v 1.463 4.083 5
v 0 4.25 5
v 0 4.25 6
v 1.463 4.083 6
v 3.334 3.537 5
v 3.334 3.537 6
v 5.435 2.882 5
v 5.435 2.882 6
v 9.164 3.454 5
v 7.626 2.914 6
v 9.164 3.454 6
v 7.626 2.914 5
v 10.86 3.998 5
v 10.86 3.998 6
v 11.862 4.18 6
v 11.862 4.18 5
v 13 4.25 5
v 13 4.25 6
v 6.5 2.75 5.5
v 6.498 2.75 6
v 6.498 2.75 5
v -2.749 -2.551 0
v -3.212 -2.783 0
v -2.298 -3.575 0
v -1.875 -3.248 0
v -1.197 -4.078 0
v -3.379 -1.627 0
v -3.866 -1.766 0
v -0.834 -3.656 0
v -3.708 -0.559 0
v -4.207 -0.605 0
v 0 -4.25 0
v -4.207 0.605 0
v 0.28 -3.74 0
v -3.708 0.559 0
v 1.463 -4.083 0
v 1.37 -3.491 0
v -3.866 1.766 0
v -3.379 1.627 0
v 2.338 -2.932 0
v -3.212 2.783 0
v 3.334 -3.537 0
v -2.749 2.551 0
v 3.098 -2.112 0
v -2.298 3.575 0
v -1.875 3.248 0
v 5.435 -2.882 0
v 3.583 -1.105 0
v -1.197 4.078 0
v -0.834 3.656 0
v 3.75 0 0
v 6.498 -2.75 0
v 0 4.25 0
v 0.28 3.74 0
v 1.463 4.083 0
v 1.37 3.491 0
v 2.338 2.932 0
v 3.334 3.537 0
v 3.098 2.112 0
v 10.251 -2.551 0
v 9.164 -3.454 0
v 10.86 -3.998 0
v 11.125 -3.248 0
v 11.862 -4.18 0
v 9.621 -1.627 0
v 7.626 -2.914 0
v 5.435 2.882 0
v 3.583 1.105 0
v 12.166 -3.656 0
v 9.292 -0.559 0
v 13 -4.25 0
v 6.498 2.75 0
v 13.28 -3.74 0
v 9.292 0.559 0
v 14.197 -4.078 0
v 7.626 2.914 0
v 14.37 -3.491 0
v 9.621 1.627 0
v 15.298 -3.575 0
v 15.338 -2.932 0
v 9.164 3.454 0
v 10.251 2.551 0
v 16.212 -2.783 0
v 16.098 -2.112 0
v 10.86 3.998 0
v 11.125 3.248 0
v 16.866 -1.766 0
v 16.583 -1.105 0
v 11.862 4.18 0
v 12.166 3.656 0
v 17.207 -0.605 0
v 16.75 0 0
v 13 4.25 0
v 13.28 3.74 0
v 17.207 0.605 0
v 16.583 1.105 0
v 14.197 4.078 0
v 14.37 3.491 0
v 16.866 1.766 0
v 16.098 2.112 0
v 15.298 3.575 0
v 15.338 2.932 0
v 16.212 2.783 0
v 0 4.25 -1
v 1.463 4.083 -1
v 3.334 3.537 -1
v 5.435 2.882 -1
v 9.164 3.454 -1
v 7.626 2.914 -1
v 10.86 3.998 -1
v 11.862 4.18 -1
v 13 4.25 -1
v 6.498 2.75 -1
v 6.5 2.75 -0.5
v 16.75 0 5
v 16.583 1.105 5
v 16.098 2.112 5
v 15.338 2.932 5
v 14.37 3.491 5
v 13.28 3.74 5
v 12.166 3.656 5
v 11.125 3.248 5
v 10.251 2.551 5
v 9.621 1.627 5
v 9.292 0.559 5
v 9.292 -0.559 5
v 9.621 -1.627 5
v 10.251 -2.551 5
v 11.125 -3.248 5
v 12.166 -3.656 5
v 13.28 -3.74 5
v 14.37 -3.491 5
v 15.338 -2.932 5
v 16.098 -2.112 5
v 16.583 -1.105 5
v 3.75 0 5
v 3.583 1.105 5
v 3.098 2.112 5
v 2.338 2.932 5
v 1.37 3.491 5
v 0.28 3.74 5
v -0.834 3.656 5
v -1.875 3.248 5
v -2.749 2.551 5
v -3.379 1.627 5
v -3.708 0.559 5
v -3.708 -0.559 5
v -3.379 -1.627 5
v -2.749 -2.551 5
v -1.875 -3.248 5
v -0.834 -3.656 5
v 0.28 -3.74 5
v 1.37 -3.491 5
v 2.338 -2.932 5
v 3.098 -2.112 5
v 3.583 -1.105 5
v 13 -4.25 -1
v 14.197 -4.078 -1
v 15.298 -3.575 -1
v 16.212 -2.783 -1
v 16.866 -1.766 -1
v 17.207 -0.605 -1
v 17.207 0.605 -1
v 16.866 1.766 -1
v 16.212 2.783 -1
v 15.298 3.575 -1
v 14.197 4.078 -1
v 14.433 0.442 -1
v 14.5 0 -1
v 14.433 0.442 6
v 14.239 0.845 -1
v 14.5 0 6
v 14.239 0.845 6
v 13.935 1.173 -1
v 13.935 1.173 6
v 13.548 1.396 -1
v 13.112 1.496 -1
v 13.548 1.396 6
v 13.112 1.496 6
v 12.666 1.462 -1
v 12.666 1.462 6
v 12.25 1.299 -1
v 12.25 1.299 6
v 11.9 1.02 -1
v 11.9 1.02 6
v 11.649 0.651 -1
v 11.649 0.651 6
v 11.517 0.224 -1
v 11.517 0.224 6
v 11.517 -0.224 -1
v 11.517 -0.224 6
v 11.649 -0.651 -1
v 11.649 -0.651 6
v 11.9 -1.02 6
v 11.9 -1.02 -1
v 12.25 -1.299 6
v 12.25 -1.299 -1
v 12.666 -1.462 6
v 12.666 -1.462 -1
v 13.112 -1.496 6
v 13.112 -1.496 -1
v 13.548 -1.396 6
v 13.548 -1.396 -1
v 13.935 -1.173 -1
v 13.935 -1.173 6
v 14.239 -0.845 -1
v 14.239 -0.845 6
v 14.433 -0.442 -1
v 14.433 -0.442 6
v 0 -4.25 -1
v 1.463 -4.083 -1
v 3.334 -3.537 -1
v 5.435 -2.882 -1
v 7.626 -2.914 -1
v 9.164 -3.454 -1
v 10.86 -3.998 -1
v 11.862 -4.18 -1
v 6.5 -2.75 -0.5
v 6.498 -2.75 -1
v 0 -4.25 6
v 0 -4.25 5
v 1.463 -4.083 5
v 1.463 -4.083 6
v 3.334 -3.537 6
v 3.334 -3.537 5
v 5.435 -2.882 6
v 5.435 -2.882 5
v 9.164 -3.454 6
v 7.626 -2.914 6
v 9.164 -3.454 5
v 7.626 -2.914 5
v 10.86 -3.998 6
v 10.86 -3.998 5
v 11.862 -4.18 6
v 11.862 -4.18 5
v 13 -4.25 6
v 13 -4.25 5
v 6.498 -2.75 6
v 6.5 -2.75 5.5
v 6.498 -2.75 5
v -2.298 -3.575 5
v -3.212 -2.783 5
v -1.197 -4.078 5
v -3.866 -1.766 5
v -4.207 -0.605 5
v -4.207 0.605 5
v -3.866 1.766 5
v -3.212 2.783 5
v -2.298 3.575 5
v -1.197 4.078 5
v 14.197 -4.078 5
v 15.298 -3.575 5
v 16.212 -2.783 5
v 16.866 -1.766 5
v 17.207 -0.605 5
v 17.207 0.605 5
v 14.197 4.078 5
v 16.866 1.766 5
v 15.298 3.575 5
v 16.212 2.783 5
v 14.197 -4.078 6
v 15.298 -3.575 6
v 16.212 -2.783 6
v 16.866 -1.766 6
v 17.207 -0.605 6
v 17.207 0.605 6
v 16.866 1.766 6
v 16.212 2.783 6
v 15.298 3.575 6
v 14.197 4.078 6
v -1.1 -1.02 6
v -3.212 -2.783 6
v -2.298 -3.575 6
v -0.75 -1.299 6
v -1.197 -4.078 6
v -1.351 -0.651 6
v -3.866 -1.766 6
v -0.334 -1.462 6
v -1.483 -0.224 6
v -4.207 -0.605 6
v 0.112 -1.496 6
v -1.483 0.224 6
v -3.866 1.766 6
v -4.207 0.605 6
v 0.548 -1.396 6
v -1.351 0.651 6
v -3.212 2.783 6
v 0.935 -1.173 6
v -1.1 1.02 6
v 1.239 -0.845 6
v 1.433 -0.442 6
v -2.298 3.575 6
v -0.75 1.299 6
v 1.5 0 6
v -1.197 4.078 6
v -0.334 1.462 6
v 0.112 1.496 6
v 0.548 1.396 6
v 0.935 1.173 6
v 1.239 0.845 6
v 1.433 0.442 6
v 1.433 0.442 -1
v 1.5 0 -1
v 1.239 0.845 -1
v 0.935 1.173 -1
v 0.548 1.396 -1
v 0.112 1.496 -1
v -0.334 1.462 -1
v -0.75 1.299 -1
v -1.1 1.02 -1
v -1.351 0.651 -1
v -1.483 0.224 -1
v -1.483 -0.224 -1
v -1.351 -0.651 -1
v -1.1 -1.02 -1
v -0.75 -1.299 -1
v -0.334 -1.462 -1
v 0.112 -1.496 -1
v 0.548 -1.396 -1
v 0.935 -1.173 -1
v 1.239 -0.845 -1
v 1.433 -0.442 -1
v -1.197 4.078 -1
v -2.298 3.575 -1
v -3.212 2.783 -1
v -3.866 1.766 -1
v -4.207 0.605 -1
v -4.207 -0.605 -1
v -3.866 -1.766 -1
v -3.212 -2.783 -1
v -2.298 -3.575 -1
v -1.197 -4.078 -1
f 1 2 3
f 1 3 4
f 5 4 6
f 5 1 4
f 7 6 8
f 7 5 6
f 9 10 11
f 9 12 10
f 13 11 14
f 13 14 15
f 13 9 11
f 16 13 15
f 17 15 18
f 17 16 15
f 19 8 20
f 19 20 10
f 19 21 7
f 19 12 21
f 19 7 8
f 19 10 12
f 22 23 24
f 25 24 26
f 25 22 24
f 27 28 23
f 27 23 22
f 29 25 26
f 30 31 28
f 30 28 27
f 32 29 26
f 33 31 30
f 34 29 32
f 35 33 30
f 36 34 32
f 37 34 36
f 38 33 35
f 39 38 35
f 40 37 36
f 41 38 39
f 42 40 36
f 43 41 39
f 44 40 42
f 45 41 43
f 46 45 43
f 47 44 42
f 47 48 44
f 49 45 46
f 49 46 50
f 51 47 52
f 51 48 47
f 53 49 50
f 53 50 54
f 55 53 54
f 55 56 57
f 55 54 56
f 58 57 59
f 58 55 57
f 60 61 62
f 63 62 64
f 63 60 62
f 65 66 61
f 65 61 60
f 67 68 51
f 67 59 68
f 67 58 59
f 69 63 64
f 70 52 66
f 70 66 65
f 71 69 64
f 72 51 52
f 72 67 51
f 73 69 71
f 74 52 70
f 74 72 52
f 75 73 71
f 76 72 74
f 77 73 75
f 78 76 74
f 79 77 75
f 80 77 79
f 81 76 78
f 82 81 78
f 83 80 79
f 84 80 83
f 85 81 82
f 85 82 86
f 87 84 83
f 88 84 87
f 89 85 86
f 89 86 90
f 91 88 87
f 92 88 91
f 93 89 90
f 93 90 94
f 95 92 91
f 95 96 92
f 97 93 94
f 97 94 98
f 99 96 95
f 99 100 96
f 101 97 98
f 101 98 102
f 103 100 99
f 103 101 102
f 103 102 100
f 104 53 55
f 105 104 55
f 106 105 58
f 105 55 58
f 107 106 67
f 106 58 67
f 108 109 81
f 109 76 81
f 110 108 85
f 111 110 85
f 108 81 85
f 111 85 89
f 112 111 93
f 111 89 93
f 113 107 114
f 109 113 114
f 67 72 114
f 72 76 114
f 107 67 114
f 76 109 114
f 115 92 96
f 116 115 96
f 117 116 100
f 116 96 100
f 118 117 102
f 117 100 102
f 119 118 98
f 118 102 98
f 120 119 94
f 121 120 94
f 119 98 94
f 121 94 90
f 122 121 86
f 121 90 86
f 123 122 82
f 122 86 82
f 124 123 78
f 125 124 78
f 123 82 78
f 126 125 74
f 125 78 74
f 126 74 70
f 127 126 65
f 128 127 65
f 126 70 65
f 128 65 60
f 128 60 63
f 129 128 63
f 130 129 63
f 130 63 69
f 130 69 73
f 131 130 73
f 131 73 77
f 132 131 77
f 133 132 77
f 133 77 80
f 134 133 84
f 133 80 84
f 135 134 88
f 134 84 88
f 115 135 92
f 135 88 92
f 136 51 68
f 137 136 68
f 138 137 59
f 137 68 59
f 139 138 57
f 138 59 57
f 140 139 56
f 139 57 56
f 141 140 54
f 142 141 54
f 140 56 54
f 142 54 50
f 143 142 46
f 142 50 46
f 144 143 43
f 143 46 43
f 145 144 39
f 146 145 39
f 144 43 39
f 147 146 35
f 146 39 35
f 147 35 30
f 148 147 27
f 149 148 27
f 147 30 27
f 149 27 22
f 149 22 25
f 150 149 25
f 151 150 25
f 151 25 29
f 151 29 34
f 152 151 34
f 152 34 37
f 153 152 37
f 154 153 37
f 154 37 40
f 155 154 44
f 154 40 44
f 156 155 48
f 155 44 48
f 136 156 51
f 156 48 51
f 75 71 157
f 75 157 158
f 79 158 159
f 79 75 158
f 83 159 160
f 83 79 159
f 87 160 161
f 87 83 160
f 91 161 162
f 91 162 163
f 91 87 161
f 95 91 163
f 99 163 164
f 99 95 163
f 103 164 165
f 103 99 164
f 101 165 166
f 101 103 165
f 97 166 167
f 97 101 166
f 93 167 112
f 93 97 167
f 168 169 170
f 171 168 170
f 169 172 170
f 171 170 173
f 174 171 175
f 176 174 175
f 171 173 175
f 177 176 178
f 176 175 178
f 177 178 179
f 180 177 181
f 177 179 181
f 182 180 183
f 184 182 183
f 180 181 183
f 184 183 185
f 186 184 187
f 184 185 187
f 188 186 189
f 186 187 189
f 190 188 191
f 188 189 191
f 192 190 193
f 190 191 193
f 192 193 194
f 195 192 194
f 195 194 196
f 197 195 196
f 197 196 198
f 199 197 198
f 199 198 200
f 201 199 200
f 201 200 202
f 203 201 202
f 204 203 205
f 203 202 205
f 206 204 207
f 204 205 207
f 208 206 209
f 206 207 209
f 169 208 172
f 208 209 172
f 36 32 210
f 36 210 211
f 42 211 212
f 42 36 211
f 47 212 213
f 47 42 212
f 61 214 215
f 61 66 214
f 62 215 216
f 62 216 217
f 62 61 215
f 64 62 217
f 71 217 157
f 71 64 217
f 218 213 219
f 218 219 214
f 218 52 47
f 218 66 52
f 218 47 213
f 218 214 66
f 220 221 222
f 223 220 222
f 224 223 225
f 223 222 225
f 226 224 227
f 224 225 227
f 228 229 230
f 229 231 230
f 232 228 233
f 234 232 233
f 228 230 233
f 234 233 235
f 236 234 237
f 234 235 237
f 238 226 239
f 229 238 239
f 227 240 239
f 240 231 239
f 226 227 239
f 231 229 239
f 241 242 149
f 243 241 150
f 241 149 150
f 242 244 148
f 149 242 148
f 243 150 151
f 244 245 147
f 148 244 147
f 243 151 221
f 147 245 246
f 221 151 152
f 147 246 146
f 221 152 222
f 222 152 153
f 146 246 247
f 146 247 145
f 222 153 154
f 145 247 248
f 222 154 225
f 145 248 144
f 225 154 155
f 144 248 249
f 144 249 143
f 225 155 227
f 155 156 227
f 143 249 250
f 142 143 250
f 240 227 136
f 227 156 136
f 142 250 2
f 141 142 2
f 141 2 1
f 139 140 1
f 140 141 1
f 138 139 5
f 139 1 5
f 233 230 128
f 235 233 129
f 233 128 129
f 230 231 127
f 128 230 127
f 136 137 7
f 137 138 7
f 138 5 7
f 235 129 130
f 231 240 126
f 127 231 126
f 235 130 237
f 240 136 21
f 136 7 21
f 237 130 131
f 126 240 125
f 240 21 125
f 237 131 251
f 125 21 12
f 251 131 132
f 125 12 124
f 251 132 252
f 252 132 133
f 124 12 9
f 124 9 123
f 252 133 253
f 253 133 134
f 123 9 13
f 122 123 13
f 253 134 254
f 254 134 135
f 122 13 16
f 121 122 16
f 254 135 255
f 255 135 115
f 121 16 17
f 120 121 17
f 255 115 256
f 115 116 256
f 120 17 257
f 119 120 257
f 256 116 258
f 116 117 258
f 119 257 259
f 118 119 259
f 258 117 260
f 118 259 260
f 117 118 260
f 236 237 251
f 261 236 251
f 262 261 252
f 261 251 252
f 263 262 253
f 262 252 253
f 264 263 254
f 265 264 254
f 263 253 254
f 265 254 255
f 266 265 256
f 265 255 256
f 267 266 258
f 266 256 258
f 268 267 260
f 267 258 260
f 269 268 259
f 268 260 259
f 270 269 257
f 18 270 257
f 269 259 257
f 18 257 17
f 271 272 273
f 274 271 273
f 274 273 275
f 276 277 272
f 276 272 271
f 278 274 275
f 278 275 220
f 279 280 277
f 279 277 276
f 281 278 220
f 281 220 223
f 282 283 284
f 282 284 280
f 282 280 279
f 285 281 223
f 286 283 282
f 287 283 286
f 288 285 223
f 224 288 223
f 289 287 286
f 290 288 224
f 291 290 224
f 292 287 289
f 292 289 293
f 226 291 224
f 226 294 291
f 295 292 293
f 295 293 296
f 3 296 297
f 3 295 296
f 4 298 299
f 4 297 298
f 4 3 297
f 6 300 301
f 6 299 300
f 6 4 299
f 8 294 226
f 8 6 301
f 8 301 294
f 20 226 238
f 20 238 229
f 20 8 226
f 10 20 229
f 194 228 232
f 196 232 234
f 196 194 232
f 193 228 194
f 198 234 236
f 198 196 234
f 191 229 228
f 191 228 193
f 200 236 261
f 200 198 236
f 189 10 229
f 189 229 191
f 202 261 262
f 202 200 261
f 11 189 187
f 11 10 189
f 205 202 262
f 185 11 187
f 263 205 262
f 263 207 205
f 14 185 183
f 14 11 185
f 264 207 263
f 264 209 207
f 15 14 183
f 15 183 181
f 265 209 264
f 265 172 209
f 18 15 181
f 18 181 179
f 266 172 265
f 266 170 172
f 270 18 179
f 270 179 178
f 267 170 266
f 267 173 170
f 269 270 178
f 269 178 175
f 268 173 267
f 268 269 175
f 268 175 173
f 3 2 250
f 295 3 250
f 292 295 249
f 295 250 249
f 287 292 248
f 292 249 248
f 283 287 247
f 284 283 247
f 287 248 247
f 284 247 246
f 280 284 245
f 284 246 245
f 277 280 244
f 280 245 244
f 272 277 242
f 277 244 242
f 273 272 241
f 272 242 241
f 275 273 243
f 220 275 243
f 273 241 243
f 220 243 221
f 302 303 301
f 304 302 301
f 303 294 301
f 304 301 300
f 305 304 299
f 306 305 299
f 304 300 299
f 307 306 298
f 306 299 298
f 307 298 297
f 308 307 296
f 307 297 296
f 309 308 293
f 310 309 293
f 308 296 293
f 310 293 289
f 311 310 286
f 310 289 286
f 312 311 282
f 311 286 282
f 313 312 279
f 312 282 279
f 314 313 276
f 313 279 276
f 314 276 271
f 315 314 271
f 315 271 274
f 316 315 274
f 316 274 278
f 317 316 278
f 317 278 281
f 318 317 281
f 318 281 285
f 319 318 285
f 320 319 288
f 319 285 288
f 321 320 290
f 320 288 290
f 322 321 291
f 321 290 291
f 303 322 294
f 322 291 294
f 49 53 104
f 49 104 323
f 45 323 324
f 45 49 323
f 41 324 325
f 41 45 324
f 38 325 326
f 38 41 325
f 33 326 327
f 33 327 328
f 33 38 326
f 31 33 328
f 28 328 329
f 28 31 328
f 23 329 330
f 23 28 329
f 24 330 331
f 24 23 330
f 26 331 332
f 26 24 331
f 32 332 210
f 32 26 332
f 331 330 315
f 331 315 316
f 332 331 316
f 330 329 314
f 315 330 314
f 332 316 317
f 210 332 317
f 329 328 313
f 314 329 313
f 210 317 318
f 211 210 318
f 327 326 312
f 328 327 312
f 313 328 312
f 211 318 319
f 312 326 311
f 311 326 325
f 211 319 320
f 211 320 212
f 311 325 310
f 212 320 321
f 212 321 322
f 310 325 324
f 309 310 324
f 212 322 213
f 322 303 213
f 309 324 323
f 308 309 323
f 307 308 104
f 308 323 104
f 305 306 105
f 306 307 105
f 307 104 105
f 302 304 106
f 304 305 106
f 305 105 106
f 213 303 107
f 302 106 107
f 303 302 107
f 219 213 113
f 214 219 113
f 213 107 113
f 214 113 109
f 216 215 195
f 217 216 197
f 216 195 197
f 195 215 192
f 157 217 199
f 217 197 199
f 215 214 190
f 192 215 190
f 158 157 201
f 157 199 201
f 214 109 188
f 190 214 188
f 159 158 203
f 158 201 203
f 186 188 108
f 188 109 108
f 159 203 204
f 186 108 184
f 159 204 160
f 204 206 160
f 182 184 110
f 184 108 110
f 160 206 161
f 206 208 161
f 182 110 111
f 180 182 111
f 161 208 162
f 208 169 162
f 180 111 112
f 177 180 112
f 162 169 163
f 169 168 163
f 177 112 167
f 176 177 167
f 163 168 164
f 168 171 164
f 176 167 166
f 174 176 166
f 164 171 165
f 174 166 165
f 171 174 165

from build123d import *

# Parameters (mm, degrees)
SKETCH1_R             = 3.75
SKETCH1_R_2           = 1.5
BOSS_EXTRUDE1_DEPTH   = 5
BOSS_EXTRUDE1_2_DEPTH = 5
SKETCH2_R             = 1.5
BOSS_EXTRUDE2_DEPTH   = 1


with BuildPart() as part:
    # Sketch1 → Boss-Extrude1 (new body)
    with BuildSketch(Plane.XY):
        Circle(SKETCH1_R)
        Circle(SKETCH1_R_2, mode=Mode.SUBTRACT)
    extrude(amount=BOSS_EXTRUDE1_DEPTH)



with BuildPart() as body_2:
    # Sketch1 → Boss-Extrude1 2 (new body)
    with BuildSketch(Plane.XY):
        with Locations((13, 0)):
            Circle(SKETCH1_R)
        with Locations((13, 0)):
            Circle(SKETCH1_R_2, mode=Mode.SUBTRACT)
    extrude(amount=BOSS_EXTRUDE1_2_DEPTH)


with BuildPart() as part_1:
    add(part.part)

    add(body_2.part)  # Boss-Extrude2 merges body 2
    # Sketch2 → Boss-Extrude2 (add)
    with BuildSketch(Plane.XY.offset(5)):
        with BuildLine():
            ThreePointArc((0, 4.25), (-4.25, 0), (0, -4.25))
            add(Edge.make_bspline(
                [(0, -4.25), (2.386303511, -4.25), (6.863643386, -1.25), (9.886409718, -4.25), (13, -4.25)],
                knots=[0, 0, 0, 0, 0.5, 1, 1, 1, 1], degree=3))
            ThreePointArc((13, -4.25), (17.25, 0), (13, 4.25))
            add(Edge.make_bspline(
                [(0, 4.25), (2.386303511, 4.25), (6.863643386, 1.25), (9.886409718, 4.25), (13, 4.25)],
                knots=[0, 0, 0, 0, 0.5, 1, 1, 1, 1], degree=3))
        make_face()
        Circle(SKETCH2_R, mode=Mode.SUBTRACT)
        with Locations((13, 0)):
            Circle(SKETCH2_R, mode=Mode.SUBTRACT)
    boss_extrude2 = extrude(amount=BOSS_EXTRUDE2_DEPTH)

    # Mirror1: Boss-Extrude2 across plane
    add(boss_extrude2.mirror(Plane(origin=(0, 0, 2.5), x_dir=(1, 0, 0), z_dir=(0, 0, -1))))


solid = part_1.part
